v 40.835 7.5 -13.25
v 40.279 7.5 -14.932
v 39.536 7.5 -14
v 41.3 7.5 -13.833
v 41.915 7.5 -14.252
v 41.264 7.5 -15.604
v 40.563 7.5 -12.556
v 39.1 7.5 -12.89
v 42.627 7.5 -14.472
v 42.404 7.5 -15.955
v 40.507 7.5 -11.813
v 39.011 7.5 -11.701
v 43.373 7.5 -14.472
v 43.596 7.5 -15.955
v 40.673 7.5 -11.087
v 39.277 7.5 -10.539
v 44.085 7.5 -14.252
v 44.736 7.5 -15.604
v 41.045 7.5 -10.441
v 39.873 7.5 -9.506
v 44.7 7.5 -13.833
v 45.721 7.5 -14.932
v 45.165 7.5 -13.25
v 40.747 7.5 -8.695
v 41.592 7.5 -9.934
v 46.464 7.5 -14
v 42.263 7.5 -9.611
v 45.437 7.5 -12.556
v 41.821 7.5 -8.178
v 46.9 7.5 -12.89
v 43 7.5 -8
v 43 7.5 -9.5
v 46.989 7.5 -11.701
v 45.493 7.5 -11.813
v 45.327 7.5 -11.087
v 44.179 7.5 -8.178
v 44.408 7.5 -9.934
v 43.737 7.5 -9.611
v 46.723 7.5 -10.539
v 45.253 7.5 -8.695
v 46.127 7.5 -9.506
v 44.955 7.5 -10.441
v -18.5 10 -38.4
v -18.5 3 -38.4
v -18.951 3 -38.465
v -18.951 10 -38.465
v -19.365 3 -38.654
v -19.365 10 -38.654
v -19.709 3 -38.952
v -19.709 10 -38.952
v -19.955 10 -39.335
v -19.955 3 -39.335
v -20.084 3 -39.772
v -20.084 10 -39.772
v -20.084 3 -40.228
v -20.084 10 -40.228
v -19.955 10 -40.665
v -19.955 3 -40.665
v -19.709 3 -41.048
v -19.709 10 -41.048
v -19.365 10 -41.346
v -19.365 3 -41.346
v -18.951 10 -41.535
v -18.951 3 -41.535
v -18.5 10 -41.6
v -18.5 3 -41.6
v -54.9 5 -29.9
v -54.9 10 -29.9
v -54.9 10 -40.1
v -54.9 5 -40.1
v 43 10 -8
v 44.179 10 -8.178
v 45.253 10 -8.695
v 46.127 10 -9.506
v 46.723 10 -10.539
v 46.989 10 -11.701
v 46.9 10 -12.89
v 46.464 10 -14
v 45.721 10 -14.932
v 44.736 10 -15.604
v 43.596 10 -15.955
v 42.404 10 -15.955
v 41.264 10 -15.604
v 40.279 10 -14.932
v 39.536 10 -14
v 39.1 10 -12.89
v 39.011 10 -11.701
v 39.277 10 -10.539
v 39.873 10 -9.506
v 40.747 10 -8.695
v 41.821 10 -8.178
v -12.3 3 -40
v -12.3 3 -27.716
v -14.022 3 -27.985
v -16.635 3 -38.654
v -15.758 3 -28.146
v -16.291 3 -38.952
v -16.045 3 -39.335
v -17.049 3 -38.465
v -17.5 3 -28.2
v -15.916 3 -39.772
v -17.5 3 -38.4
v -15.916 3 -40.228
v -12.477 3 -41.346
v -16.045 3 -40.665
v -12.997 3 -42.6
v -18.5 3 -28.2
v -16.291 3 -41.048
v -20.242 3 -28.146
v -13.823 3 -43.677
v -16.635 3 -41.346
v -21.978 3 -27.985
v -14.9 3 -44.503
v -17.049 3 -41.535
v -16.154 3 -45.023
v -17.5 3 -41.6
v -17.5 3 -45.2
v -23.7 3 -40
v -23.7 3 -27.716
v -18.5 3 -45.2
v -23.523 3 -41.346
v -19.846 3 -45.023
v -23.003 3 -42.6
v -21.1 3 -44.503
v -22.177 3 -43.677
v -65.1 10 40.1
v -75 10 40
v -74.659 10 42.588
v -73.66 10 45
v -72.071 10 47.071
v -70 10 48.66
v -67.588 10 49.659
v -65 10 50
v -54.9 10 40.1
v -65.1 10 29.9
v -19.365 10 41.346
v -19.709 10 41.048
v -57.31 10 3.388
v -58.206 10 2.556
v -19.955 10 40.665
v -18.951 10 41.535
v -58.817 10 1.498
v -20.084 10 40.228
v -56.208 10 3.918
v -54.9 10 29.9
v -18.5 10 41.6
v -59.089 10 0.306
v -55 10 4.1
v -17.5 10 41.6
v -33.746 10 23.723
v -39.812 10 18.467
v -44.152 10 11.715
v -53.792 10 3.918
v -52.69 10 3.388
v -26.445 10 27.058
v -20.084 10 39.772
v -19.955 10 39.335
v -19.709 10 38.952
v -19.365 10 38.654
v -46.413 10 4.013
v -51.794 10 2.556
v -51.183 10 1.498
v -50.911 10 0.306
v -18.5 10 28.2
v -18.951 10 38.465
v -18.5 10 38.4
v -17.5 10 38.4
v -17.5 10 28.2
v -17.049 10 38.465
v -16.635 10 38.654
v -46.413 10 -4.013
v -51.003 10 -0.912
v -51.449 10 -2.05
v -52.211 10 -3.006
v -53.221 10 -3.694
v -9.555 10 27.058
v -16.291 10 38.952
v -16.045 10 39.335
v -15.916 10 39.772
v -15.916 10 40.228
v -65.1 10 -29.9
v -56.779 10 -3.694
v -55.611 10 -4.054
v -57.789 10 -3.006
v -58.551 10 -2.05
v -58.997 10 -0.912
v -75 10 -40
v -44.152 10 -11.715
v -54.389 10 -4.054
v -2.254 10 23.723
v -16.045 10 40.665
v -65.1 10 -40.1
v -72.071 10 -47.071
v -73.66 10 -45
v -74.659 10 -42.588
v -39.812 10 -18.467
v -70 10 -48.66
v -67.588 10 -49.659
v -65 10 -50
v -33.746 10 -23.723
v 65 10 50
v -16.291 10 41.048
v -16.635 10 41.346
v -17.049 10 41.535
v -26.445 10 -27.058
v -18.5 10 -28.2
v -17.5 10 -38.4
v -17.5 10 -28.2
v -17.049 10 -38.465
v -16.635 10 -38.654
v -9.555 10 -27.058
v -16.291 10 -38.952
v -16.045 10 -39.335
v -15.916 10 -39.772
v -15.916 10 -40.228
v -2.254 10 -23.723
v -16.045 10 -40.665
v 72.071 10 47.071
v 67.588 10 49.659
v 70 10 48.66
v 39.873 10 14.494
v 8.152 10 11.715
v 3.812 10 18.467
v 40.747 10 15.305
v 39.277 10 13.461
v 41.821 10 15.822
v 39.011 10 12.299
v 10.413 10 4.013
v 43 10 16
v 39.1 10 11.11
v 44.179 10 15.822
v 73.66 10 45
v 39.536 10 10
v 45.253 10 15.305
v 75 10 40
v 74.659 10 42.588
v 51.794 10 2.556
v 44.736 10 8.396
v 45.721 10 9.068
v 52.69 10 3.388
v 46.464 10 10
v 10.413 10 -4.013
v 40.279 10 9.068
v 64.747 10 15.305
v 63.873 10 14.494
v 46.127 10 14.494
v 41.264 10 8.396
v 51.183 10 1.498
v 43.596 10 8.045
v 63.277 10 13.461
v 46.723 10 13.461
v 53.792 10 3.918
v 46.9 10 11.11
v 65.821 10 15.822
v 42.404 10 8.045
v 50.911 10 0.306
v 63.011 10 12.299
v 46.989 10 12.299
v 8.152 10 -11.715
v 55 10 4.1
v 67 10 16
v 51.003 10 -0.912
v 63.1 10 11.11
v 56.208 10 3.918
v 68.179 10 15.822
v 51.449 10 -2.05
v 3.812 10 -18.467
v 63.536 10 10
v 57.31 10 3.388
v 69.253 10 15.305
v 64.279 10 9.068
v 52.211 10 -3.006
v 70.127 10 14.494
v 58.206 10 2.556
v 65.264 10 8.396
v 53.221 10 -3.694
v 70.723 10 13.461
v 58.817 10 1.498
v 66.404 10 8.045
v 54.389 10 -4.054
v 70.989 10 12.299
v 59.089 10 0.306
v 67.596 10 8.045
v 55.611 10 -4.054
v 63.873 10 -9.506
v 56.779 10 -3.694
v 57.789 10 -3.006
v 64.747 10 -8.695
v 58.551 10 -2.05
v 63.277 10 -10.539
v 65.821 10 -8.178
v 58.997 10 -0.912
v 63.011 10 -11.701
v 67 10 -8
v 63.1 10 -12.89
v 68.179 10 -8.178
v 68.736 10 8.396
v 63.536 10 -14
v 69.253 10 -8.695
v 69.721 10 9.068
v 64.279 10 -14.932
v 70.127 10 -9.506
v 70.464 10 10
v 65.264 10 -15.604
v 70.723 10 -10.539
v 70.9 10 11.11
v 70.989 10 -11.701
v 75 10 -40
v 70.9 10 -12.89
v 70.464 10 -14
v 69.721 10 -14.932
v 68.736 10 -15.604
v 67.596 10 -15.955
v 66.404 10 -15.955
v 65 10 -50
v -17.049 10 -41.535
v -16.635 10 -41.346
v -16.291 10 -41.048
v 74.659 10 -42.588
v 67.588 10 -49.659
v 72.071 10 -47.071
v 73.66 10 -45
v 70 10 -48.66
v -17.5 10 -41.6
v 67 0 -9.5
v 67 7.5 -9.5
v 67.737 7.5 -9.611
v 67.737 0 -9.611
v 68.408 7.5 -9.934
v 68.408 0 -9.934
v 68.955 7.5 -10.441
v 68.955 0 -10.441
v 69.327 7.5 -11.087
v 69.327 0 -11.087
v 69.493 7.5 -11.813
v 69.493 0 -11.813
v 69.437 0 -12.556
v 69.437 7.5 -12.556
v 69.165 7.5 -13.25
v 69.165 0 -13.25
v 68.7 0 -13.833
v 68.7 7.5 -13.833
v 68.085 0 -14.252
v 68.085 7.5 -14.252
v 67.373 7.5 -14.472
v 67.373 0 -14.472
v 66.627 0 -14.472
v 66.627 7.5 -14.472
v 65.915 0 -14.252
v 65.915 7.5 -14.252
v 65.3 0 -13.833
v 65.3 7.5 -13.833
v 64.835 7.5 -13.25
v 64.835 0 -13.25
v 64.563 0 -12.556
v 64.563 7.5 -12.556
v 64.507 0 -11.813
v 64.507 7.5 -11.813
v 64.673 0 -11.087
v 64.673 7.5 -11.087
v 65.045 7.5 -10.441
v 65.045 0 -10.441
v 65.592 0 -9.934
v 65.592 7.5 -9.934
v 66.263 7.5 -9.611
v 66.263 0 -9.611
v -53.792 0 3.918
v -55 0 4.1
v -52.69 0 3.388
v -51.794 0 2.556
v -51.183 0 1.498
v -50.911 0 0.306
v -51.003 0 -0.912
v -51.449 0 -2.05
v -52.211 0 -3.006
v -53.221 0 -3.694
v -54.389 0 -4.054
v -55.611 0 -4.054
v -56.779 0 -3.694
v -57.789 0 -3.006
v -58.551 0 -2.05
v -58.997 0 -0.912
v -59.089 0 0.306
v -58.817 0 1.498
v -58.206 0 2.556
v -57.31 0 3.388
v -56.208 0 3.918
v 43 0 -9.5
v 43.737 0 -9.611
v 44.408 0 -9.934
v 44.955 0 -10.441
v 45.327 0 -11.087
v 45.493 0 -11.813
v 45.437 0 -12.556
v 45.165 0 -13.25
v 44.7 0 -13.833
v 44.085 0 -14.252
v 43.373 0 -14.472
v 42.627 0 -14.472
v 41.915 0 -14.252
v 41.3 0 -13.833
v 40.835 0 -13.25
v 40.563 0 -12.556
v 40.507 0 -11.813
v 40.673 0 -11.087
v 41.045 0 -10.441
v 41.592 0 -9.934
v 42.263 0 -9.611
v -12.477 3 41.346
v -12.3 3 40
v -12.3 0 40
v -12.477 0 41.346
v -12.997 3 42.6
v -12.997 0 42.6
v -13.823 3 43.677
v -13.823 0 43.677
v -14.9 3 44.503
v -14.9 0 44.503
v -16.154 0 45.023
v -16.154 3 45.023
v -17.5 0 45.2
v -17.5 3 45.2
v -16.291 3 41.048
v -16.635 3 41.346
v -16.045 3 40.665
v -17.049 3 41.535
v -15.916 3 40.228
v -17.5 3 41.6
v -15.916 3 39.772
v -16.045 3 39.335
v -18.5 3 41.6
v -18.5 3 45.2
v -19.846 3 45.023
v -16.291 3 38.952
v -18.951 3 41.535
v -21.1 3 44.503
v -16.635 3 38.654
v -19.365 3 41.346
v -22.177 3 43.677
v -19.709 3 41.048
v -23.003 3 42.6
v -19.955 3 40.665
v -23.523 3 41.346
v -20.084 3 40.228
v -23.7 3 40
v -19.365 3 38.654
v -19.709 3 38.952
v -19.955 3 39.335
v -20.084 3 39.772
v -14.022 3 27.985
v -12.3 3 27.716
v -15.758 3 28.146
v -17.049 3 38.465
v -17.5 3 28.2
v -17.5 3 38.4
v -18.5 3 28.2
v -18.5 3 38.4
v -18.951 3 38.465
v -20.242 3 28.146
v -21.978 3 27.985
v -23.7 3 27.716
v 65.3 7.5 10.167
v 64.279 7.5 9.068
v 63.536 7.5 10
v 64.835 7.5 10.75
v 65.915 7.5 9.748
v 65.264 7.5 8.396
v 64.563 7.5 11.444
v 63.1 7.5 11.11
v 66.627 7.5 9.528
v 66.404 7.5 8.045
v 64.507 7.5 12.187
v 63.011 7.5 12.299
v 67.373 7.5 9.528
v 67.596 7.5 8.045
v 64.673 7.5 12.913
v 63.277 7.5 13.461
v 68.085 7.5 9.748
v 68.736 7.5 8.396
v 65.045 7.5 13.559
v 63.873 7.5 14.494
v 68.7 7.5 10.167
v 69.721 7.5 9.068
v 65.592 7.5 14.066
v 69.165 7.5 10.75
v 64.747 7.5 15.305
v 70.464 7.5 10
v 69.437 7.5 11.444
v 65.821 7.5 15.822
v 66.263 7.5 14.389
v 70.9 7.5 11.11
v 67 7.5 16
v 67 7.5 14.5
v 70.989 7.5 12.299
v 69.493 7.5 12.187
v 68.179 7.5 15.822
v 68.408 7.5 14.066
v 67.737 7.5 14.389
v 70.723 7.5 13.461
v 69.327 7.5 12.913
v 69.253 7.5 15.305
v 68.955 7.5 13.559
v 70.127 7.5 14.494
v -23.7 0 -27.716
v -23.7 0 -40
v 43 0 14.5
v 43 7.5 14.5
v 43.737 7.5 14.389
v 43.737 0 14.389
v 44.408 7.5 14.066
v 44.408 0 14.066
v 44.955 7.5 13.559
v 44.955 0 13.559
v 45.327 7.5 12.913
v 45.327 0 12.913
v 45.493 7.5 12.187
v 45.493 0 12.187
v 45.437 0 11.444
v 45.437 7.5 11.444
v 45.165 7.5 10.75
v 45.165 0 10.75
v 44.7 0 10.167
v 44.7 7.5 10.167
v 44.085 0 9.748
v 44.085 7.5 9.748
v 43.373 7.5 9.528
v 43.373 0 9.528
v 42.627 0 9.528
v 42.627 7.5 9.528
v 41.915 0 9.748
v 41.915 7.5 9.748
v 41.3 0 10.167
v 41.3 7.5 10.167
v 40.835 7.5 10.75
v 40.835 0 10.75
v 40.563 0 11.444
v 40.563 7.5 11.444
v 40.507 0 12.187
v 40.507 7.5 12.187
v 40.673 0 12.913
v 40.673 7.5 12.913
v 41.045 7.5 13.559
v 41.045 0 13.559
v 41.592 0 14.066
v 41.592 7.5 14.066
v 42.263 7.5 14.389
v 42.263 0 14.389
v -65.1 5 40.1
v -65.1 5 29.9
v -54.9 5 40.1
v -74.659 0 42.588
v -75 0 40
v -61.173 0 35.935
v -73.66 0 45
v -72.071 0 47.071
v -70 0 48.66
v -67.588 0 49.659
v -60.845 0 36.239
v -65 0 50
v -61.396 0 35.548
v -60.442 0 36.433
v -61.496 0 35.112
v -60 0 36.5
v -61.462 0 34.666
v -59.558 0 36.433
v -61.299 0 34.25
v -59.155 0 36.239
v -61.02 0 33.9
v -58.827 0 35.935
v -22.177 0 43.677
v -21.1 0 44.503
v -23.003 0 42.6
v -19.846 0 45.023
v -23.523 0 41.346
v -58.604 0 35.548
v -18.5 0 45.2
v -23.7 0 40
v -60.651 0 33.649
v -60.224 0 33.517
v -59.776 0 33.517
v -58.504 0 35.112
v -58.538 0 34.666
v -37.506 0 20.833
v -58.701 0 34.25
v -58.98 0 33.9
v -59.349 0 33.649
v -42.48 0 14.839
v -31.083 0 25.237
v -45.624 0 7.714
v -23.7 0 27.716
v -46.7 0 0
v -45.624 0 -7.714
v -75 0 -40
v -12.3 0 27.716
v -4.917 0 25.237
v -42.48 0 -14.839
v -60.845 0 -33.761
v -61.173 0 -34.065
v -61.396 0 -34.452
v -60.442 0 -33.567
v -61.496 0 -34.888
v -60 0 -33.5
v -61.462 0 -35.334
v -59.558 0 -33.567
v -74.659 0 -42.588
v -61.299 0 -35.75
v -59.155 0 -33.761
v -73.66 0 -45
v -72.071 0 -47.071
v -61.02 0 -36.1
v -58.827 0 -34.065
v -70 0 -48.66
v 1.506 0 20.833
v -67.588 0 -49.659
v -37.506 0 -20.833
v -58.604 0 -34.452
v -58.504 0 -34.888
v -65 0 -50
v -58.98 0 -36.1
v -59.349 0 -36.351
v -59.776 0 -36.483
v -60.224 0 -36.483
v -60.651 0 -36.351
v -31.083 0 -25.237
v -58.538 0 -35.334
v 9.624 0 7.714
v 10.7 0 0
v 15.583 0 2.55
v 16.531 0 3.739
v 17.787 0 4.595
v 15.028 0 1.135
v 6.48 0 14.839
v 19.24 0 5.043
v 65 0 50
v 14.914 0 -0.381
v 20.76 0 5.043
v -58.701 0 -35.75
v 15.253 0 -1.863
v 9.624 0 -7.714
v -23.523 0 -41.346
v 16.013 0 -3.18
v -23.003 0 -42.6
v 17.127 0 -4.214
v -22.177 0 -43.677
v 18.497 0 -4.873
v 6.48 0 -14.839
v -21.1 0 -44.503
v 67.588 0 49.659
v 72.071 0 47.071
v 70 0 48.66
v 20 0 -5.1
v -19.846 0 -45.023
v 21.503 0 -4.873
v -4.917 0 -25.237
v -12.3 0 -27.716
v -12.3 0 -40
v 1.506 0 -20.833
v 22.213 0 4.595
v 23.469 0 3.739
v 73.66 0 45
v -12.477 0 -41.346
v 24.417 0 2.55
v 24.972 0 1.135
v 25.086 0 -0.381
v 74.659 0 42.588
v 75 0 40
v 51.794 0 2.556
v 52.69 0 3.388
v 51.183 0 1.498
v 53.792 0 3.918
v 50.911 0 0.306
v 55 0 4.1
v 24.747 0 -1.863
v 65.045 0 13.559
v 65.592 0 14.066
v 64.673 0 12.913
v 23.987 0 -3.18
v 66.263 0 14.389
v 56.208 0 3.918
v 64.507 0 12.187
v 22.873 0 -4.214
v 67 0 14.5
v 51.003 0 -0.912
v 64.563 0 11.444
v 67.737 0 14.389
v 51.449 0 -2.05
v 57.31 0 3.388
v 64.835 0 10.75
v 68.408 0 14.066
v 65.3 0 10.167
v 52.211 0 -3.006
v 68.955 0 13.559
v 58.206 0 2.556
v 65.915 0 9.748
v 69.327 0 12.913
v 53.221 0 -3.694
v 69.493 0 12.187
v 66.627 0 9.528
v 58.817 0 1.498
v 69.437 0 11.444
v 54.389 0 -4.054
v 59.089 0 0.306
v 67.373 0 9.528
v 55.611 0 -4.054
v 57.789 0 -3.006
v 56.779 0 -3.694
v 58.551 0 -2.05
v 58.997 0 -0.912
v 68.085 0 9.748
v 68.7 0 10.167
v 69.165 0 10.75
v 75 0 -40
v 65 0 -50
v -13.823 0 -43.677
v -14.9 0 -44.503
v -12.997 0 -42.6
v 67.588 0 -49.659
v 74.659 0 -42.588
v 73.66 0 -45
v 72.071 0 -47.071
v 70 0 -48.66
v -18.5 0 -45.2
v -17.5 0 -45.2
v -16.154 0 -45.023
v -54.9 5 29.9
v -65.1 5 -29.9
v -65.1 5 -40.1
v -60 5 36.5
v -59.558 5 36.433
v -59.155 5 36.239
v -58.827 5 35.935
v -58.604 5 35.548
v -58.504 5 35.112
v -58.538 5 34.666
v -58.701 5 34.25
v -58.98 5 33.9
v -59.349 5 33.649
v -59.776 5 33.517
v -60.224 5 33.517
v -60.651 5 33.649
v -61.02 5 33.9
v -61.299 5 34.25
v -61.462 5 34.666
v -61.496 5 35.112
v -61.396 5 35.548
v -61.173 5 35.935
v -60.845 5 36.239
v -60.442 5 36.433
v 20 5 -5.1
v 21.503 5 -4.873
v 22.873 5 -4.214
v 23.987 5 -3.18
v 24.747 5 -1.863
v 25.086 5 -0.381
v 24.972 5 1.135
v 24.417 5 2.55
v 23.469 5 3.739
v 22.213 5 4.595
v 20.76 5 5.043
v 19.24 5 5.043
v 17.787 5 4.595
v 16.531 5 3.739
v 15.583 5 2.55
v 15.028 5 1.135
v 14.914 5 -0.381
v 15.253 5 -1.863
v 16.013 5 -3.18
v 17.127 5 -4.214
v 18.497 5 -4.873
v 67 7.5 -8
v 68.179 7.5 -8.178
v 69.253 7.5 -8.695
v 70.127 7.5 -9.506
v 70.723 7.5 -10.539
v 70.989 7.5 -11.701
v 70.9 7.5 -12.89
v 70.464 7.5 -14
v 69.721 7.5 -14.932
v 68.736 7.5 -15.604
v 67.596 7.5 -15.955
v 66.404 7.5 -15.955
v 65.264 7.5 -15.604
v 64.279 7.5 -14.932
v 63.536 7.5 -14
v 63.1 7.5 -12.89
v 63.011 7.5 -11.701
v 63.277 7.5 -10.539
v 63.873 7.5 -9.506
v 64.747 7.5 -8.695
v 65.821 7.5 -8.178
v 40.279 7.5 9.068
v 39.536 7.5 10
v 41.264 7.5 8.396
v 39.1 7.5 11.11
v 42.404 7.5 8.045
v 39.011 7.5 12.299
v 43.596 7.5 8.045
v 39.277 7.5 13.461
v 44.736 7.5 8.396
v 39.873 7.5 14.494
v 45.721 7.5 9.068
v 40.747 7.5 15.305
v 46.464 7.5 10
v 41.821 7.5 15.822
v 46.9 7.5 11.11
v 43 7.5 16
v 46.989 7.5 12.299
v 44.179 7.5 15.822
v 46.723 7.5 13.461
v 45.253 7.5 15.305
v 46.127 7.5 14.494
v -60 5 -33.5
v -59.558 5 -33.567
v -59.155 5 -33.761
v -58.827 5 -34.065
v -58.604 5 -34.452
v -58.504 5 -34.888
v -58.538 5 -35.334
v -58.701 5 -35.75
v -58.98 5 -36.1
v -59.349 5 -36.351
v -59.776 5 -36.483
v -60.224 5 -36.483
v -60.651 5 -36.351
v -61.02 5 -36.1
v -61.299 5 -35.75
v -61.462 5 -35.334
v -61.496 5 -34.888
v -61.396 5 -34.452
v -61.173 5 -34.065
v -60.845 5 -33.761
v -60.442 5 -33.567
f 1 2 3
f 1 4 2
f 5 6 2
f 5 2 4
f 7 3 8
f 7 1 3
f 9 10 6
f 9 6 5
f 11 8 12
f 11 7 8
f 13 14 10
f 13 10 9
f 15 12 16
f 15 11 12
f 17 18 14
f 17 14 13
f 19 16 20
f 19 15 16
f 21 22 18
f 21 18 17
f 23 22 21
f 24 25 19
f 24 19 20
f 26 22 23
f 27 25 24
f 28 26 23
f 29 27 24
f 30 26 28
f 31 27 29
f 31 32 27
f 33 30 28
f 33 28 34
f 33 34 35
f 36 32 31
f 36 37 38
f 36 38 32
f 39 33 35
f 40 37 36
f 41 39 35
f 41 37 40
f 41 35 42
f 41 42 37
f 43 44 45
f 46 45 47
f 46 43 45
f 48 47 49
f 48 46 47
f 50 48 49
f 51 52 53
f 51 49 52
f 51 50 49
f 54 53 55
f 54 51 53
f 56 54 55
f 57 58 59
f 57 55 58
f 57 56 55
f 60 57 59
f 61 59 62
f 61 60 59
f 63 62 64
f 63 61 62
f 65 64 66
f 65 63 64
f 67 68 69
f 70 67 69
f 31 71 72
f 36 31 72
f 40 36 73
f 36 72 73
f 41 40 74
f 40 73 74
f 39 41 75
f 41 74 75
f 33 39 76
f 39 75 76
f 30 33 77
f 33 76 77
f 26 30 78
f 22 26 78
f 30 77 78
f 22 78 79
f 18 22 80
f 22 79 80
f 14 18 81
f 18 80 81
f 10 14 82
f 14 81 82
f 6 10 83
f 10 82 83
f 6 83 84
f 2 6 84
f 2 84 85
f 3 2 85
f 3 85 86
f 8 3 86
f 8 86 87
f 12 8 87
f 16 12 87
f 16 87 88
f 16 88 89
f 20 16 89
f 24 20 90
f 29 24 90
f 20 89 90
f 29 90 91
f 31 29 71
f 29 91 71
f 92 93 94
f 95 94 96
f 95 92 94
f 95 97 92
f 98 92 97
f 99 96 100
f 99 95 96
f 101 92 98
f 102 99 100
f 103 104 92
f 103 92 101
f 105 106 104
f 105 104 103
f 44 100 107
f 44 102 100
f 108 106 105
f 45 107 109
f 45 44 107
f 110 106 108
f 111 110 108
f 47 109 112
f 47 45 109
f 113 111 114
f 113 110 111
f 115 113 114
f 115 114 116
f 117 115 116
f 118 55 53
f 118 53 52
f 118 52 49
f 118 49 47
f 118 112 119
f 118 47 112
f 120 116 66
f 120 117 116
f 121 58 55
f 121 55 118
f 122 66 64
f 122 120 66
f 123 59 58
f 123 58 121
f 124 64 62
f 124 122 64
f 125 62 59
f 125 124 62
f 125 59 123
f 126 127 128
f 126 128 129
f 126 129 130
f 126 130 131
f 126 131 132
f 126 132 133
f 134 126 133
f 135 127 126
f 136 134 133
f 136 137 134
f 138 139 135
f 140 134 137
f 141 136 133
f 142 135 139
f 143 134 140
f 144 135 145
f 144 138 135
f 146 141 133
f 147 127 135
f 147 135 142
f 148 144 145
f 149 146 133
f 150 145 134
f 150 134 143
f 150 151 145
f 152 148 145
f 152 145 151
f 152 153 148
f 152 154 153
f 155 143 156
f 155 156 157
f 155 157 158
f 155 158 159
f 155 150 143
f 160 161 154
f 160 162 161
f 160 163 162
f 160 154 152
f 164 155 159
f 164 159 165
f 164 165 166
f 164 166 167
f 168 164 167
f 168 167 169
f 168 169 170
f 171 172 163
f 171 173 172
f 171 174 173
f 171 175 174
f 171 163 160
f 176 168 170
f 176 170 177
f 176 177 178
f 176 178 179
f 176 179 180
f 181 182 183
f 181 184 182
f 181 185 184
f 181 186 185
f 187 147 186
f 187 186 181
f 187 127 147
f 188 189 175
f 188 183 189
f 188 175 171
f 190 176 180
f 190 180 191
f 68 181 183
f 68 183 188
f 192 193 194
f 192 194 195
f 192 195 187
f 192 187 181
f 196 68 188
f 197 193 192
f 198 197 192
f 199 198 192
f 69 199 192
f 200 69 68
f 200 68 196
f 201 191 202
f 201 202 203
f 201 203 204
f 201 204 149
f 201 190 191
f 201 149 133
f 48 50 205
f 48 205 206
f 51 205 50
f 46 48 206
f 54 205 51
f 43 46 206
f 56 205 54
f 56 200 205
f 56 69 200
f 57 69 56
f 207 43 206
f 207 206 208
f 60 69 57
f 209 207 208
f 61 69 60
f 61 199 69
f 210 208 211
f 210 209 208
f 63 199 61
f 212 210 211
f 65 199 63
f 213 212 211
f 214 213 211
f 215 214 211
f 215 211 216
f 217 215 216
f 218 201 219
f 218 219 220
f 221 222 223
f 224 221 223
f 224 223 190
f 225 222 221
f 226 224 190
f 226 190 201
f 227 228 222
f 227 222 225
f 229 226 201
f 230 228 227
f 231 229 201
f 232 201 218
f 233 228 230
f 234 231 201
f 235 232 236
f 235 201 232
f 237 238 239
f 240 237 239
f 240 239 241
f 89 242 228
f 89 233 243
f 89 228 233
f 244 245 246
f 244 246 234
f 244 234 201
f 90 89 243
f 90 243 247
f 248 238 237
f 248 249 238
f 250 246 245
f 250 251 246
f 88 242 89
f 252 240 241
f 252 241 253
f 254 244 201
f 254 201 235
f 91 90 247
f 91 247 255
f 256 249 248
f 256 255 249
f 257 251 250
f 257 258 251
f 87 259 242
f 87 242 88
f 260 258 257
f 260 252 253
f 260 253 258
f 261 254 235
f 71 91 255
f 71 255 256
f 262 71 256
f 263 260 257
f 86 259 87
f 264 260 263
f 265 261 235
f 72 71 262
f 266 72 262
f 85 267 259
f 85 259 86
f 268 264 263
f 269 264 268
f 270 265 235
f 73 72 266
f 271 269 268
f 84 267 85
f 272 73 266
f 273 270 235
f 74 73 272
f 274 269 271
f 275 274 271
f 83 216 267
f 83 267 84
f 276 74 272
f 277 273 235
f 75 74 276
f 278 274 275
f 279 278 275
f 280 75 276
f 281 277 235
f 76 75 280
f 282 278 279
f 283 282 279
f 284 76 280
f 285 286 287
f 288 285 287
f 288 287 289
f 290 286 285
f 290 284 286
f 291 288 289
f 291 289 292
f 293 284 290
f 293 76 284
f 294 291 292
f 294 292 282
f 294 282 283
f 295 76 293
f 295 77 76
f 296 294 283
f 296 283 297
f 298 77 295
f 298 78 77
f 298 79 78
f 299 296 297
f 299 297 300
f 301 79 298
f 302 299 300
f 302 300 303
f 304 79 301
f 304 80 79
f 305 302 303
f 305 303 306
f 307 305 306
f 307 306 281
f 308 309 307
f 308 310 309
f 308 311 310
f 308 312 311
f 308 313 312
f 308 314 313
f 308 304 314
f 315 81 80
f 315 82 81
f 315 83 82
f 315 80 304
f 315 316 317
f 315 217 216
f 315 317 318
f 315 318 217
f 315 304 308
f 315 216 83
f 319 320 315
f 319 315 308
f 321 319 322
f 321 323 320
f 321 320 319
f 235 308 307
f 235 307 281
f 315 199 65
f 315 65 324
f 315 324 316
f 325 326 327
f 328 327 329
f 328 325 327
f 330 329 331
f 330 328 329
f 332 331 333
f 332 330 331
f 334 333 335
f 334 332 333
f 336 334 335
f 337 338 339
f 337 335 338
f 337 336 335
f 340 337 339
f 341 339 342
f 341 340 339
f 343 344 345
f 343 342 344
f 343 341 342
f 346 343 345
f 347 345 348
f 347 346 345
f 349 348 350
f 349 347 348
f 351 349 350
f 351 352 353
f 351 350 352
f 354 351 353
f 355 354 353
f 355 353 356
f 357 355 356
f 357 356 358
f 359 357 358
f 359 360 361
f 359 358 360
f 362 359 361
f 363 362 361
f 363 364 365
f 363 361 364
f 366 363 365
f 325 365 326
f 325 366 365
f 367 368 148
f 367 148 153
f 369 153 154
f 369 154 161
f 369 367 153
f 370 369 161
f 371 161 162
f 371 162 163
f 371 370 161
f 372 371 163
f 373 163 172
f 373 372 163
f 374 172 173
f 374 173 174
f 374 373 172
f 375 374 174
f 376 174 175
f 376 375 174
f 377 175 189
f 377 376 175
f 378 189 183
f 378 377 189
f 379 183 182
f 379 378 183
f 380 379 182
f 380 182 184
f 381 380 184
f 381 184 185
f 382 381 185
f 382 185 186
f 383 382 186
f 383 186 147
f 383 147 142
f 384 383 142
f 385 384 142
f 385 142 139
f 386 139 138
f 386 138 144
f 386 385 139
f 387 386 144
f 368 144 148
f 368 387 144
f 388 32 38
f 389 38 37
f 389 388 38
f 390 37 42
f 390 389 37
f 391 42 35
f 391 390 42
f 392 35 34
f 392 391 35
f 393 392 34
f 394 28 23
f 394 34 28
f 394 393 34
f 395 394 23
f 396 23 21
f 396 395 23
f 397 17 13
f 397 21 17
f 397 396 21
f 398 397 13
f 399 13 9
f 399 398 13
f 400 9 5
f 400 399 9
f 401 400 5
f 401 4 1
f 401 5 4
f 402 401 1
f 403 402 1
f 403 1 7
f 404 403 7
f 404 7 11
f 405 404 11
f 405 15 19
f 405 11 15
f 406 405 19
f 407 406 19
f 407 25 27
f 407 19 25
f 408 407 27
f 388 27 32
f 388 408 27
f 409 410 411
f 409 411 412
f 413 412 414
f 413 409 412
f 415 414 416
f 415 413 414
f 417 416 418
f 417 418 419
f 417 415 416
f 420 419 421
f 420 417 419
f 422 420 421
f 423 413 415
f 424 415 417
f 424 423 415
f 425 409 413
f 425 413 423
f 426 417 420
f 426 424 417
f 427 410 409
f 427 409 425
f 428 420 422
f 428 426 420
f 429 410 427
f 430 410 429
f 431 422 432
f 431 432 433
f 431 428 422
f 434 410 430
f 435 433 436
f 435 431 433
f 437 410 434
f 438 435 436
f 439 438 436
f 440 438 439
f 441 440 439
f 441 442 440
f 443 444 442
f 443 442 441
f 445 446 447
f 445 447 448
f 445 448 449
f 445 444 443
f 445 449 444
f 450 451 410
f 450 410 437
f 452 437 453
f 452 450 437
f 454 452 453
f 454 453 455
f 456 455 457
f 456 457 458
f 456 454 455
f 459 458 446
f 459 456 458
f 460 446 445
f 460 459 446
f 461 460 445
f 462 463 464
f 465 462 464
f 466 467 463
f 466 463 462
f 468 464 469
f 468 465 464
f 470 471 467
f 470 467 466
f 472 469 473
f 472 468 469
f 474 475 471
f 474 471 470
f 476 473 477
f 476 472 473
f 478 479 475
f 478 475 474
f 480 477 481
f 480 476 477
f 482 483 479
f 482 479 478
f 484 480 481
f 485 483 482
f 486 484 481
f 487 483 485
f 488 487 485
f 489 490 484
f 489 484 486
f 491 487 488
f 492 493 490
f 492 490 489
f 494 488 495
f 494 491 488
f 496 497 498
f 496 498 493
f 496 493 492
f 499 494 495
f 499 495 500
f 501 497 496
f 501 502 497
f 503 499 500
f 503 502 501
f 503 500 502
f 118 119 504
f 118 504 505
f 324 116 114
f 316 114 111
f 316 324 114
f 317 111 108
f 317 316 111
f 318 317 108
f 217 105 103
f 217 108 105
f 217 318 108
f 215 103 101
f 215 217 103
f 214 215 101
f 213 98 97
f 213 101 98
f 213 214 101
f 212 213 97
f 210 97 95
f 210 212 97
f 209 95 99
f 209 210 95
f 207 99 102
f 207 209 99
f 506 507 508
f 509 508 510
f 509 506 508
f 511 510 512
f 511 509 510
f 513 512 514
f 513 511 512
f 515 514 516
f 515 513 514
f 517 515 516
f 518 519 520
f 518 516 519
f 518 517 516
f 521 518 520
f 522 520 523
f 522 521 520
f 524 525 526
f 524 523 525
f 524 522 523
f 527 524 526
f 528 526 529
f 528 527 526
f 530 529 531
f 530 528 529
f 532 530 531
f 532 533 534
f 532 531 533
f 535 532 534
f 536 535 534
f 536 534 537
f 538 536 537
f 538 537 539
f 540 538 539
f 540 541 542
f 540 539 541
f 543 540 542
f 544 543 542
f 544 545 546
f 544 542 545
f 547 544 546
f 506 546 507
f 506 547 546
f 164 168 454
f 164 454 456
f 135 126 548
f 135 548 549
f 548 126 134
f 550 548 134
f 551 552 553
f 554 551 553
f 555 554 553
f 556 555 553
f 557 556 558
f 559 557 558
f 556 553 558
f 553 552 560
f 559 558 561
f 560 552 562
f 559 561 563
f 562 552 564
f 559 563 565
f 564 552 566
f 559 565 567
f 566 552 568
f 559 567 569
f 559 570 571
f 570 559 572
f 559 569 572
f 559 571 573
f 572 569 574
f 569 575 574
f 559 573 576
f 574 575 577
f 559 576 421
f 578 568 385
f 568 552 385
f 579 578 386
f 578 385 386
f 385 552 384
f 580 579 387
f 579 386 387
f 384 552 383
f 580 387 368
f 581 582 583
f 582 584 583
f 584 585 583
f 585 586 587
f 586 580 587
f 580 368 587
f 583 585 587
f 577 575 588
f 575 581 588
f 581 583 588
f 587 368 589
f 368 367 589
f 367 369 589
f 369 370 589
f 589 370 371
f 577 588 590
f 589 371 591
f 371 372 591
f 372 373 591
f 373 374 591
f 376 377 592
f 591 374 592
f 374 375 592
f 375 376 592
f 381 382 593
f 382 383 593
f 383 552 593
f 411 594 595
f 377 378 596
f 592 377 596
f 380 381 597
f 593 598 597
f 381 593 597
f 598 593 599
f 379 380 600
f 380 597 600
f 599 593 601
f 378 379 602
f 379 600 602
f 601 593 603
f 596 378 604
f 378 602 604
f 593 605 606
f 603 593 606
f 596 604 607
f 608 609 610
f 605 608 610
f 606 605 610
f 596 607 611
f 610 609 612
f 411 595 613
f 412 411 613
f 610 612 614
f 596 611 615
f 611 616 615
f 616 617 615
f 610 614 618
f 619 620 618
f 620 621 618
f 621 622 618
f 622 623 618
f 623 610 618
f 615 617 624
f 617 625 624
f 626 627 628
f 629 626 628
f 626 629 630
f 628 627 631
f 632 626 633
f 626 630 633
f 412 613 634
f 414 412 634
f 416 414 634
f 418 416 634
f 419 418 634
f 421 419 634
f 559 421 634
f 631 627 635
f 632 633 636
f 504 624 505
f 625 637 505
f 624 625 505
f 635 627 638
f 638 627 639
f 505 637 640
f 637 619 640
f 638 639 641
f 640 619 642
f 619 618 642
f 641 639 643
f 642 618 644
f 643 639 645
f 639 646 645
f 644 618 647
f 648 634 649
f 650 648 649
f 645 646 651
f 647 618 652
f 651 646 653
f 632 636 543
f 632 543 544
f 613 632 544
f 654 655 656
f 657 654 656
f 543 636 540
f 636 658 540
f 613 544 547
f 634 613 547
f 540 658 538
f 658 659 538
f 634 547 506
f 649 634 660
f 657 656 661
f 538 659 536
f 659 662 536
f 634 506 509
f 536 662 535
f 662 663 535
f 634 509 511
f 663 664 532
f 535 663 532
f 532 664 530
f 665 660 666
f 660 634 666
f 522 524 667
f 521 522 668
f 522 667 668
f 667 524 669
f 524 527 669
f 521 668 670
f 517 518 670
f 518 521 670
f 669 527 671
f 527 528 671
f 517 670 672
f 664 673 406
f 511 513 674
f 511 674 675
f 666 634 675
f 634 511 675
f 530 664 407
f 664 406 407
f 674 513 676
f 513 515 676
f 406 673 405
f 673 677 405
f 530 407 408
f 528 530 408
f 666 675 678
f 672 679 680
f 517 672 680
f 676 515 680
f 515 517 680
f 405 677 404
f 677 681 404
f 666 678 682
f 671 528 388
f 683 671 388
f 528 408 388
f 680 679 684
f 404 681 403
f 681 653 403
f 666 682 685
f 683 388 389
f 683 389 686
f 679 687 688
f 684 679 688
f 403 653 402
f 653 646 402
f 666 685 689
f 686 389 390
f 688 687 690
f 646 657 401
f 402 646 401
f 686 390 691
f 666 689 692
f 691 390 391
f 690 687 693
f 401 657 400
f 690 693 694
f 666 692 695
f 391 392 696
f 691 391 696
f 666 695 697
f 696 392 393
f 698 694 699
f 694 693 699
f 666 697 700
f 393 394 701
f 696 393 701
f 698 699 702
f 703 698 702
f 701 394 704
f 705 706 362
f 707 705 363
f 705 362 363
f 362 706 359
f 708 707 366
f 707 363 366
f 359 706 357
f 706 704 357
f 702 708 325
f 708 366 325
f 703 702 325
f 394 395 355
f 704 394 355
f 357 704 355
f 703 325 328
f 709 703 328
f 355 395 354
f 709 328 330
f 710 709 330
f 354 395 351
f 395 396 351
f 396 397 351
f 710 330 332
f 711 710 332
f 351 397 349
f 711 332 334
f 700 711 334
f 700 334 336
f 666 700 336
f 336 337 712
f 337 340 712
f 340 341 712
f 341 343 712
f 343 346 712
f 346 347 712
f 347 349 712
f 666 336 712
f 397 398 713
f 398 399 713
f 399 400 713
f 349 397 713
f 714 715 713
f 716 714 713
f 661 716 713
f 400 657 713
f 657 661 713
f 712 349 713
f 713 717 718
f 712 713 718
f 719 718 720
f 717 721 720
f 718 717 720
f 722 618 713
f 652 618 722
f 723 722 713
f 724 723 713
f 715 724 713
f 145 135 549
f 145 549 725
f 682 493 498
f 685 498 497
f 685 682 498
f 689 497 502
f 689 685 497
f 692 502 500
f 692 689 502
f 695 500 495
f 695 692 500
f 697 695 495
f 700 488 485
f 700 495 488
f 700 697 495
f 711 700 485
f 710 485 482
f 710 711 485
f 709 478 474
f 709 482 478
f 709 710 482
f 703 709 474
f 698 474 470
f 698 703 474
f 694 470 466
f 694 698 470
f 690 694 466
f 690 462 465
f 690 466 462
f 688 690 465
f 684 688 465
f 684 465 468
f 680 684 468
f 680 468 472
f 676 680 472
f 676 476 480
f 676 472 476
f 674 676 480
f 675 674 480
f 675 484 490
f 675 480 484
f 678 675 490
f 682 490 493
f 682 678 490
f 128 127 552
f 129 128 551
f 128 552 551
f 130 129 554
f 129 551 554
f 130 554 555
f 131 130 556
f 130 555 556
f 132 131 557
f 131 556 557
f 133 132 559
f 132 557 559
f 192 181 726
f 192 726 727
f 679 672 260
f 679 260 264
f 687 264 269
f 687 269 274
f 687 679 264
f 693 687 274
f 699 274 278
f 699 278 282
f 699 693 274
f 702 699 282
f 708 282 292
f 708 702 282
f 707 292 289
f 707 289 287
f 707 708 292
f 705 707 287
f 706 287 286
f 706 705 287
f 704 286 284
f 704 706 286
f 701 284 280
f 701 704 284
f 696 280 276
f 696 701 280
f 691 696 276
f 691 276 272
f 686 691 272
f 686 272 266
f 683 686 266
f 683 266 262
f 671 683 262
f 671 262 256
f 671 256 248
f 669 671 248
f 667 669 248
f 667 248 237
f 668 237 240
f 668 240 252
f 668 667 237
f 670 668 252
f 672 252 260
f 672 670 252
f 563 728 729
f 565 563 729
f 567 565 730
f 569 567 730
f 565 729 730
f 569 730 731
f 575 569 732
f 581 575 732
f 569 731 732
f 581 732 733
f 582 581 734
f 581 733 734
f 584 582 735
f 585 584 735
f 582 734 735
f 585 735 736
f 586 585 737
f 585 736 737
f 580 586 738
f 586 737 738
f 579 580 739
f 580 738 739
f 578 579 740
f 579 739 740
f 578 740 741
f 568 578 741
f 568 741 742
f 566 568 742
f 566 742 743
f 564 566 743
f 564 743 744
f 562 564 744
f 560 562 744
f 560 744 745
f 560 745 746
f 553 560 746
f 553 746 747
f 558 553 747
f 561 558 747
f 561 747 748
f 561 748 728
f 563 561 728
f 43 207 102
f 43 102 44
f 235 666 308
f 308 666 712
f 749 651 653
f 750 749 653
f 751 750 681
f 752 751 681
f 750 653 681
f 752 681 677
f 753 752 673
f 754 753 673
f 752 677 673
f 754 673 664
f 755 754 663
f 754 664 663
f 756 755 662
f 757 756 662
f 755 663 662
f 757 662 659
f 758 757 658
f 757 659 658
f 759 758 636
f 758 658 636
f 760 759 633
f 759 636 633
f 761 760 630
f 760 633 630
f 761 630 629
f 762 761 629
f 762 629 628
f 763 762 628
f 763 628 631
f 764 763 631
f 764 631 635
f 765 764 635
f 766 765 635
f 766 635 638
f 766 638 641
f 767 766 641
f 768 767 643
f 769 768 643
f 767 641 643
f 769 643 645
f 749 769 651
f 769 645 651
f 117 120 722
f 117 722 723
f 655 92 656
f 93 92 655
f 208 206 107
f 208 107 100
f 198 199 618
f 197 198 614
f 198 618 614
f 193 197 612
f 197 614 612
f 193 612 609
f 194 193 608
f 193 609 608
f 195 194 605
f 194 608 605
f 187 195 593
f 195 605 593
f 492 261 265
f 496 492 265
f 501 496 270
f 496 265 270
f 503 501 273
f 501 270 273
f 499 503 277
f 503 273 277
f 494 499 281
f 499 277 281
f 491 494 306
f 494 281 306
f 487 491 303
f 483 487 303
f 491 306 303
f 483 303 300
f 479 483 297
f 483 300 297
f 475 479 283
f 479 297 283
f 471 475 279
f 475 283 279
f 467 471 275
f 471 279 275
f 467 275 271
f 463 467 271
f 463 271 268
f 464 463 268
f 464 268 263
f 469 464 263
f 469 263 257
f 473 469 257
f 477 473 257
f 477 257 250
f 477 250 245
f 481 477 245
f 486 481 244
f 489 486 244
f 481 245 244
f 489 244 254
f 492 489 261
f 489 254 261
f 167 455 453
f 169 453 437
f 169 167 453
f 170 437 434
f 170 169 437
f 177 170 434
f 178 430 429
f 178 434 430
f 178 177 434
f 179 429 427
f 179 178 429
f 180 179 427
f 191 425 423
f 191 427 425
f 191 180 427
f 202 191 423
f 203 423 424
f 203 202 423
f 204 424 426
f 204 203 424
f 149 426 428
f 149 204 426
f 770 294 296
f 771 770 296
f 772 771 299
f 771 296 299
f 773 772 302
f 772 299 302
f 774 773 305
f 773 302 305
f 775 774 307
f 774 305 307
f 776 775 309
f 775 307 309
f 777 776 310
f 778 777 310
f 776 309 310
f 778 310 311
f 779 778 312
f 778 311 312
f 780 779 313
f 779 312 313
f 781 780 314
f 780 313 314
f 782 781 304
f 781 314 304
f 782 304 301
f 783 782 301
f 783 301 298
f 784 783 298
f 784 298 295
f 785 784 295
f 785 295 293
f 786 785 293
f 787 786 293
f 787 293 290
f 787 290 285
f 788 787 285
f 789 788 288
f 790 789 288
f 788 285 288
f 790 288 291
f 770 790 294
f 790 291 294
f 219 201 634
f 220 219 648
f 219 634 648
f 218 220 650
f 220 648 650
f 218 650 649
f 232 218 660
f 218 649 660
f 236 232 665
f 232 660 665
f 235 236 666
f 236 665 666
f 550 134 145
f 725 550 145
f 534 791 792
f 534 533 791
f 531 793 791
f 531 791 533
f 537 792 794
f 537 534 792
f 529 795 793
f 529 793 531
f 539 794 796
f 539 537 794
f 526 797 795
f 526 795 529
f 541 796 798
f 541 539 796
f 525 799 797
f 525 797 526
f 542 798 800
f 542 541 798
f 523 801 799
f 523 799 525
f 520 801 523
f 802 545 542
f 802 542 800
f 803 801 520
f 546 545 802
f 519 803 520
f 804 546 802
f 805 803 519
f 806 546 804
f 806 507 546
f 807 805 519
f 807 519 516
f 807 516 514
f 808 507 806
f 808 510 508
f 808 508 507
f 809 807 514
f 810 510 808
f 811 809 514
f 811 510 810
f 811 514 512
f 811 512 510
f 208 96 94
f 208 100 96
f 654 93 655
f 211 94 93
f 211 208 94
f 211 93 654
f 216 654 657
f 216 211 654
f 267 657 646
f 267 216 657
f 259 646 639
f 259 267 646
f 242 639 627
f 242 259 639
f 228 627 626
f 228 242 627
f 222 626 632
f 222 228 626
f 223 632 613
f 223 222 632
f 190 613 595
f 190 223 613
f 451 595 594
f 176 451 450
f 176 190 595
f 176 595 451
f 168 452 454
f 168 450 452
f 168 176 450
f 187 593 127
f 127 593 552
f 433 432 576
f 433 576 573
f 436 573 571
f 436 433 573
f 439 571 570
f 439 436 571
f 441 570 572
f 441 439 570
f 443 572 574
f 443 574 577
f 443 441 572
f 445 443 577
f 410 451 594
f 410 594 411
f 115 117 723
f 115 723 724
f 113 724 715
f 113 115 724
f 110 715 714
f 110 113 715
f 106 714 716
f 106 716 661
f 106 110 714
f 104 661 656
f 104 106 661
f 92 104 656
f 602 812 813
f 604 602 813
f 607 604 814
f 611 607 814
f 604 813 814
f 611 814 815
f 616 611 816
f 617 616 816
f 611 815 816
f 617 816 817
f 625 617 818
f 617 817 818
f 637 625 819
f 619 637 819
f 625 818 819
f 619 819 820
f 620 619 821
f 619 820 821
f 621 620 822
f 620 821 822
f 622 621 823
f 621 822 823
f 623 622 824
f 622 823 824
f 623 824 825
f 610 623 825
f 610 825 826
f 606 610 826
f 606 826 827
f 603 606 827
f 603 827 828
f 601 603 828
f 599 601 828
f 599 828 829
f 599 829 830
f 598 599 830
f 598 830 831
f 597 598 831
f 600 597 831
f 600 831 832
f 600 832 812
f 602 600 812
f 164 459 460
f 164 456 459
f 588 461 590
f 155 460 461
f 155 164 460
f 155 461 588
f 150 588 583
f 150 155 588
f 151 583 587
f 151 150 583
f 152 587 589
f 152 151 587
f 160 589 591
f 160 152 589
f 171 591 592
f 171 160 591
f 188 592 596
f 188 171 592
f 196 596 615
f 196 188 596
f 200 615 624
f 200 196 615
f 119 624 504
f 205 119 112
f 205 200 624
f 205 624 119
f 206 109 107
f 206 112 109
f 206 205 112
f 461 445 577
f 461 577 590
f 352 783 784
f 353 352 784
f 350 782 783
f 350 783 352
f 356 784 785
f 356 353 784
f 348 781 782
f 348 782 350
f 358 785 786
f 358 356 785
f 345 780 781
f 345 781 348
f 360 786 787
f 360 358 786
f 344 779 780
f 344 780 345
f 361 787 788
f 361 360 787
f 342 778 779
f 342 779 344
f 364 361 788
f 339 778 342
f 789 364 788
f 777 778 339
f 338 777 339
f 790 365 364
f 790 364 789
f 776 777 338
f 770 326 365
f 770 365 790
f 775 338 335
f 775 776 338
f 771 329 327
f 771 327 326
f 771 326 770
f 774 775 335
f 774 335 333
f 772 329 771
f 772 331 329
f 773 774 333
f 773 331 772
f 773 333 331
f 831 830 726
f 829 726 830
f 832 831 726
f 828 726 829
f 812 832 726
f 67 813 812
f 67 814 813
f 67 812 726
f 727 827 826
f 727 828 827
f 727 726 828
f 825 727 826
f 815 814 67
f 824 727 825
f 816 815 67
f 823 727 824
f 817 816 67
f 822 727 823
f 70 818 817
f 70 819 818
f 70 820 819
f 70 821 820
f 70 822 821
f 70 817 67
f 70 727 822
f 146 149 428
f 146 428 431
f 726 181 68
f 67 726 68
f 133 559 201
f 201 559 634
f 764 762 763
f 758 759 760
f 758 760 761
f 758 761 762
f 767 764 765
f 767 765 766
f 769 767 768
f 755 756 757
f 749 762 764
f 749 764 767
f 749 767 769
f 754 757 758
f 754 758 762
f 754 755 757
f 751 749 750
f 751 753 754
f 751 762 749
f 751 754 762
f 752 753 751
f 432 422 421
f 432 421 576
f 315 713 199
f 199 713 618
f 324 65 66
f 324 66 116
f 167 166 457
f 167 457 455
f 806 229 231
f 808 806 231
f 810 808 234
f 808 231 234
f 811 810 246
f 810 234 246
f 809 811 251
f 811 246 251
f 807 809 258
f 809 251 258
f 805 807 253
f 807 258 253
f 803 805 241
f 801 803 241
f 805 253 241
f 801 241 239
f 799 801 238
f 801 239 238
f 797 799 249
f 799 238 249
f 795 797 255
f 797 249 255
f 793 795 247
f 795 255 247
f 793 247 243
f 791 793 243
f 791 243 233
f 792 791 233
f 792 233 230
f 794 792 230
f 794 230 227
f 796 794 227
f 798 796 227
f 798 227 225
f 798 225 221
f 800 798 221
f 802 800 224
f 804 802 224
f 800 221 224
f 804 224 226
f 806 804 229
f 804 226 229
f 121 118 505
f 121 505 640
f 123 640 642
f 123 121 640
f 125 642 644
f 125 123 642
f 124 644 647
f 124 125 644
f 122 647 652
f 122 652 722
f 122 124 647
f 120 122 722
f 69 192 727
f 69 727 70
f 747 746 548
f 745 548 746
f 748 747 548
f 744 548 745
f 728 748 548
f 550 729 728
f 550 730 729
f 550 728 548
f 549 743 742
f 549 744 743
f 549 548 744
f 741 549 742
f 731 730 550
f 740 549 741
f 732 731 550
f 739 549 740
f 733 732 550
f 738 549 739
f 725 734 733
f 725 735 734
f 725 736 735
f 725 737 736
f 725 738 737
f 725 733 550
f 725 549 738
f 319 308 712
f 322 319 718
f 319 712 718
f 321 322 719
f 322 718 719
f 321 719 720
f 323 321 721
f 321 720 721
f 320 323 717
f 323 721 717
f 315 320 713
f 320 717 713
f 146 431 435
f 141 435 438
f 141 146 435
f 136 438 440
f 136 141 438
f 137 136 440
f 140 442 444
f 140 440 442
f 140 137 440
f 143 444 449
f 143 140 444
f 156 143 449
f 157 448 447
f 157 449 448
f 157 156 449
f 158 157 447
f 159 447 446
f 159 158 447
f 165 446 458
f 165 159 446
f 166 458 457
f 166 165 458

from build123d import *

# Parameters (mm, degrees)
SKETCH_1_R          = 4.1
SKETCH_1_R_2        = 2.5
EXTRUDE_1_DEPTH     = 10
CUT_EXTRUDE_3_REACH = 92.692
CUT_EXTRUDE_START   = 3
CUT_EXTRUDE_4_DEPTH = 3
SKETCH_7_R          = 5.1
CUT_EXTRUDE_5_DEPTH = 5
SKETCH_8_R          = 4
CUT_EXTRUDE_6_DEPTH = 2.5
SKETCH_9_R          = 1.5
CUT_EXTRUDE_7_DEPTH = 91.691785736
SKETCH_10_W         = 10.2
SKETCH_10_H         = 10.2
CUT_EXTRUDE_8_DEPTH = 5


with BuildPart() as part:
    # ｽｹｯﾁ1 → ﾎﾞｽ - 押し出し1 (new body)
    with BuildSketch(Plane(origin=(0, 0, 0), x_dir=(1, 0, 0), z_dir=(0, 1, 0))):
        with BuildLine():
            Line((-65, -50), (65, -50))
            ThreePointArc((65, -50), (72.071067812, -47.071067812), (75, -40))
            Line((75, -40), (75, 40))
            ThreePointArc((75, 40), (72.071067812, 47.071067812), (65, 50))
            Line((65, 50), (-65, 50))
            ThreePointArc((-65, 50), (-72.071067812, 47.071067812), (-75, 40))
            Line((-75, 40), (-75, -40))
            ThreePointArc((-75, -40), (-72.071067812, -47.071067812), (-65, -50))
        make_face()
        with Locations(Location((55, 0, 0), (0, 0, 270))):
            Circle(SKETCH_1_R, mode=Mode.SUBTRACT)
        with Locations(Location((43, 12, 0), (0, 0, 270))):
            Circle(SKETCH_1_R_2, mode=Mode.SUBTRACT)
        with Locations(Location((67, 12, 0), (0, 0, 270))):
            Circle(SKETCH_1_R_2, mode=Mode.SUBTRACT)
        with Locations(Location((67, -12, 0), (0, 0, 270))):
            Circle(SKETCH_1_R_2, mode=Mode.SUBTRACT)
        with Locations(Location((43, -12, 0), (0, 0, 270))):
            Circle(SKETCH_1_R_2, mode=Mode.SUBTRACT)
        with Locations(Location((-55, 0, 0), (0, 0, 270))):
            Circle(SKETCH_1_R, mode=Mode.SUBTRACT)
    extrude(amount=EXTRUDE_1_DEPTH)

    # ｽｹｯﾁ5 → ｶｯﾄ - 押し出し3 (cut, up to next)
    with BuildSketch(Plane(origin=(0, 10, 0), x_dir=(1, 0, 0), z_dir=(0, 1, 0)), mode=Mode.PRIVATE) as cut_extrude_3_sk1:
        with BuildLine():
            Line((-18.5, 28.2), (-17.5, 28.2))
            ThreePointArc((-17.5, 28.2), (10.7, 0), (-17.5, -28.2))
            Line((-17.5, -28.2), (-18.5, -28.2))
            ThreePointArc((-18.5, -28.2), (-46.7, 0), (-18.5, 28.2))
        make_face()
    cut_extrude_3_tool1 = extrude(cut_extrude_3_sk1.sketch, amount=-CUT_EXTRUDE_3_REACH, mode=Mode.PRIVATE) & part.part
    # ｽｹｯﾁ5 → ｶｯﾄ - 押し出し3 (cut, up to next)
    with BuildSketch(Plane(origin=(0, 10, 0), x_dir=(1, 0, 0), z_dir=(0, 1, 0)), mode=Mode.PRIVATE) as cut_extrude_3_sk2:
        with BuildLine():
            Line((-18.5, 41.6), (-17.5, 41.6))
            ThreePointArc((-17.5, 41.6), (-15.9, 40), (-17.5, 38.4))
            Line((-17.5, 38.4), (-18.5, 38.4))
            ThreePointArc((-18.5, 38.4), (-20.1, 40), (-18.5, 41.6))
        make_face()
    cut_extrude_3_tool2 = extrude(cut_extrude_3_sk2.sketch, amount=-CUT_EXTRUDE_3_REACH, mode=Mode.PRIVATE) & part.part
    # ｽｹｯﾁ5 → ｶｯﾄ - 押し出し3 (cut, up to next)
    with BuildSketch(Plane(origin=(0, 10, 0), x_dir=(1, 0, 0), z_dir=(0, 1, 0)), mode=Mode.PRIVATE) as cut_extrude_3_sk3:
        with BuildLine():
            Line((-18.5, -38.4), (-17.5, -38.4))
            ThreePointArc((-17.5, -38.4), (-15.9, -40), (-17.5, -41.6))
            Line((-17.5, -41.6), (-18.5, -41.6))
            ThreePointArc((-18.5, -41.6), (-20.1, -40), (-18.5, -38.4))
        make_face()
    cut_extrude_3_tool3 = extrude(cut_extrude_3_sk3.sketch, amount=-CUT_EXTRUDE_3_REACH, mode=Mode.PRIVATE) & part.part
    add(cut_extrude_3_tool1.solids().sort_by_distance((-18, 10, 0))[0], mode=Mode.SUBTRACT)
    add(cut_extrude_3_tool2.solids().sort_by_distance((-18, 10, -40))[0], mode=Mode.SUBTRACT)
    add(cut_extrude_3_tool3.solids().sort_by_distance((-18, 10, 40))[0], mode=Mode.SUBTRACT)

    # ｽｹｯﾁ6 → ｶｯﾄ - 押し出し4 (cut)
    with BuildSketch(Plane(origin=(0, 0, 0), x_dir=(1, 0, 0), z_dir=(0, 1, 0)).offset(CUT_EXTRUDE_START)):
        with BuildLine():
            Line((-18.5, 45.2), (-17.5, 45.2))
            ThreePointArc((-17.5, 45.2), (-13.823044738, 43.676955262), (-12.3, 40))
            Line((-12.3, 40), (-12.3, 27.716421125))
            ThreePointArc((-12.3, 27.716421125), (10.7, 0), (-12.3, -27.716421125))
            Line((-12.3, -27.716421125), (-12.3, -40))
            ThreePointArc((-12.3, -40), (-13.823044738, -43.676955262), (-17.5, -45.2))
            Line((-17.5, -45.2), (-18.5, -45.2))
            ThreePointArc((-18.5, -45.2), (-22.176955262, -43.676955262), (-23.7, -40))
            Line((-23.7, -40), (-23.7, -27.716421125))
            ThreePointArc((-23.7, -27.716421125), (-46.7, 0), (-23.7, 27.716421125))
            Line((-23.7, 27.716421125), (-23.7, 40))
            ThreePointArc((-23.7, 40), (-22.176955262, 43.676955262), (-18.5, 45.2))
        make_face()
    extrude(amount=-CUT_EXTRUDE_4_DEPTH, mode=Mode.SUBTRACT)

    # ｽｹｯﾁ7 → ｶｯﾄ - 押し出し5 (cut)
    with BuildSketch(Plane.XZ):
        with Locations(Location((20, 0, 0), (0, 0, 270))):
            Circle(SKETCH_7_R)
    extrude(amount=-CUT_EXTRUDE_5_DEPTH, mode=Mode.SUBTRACT)

    # ｽｹｯﾁ8 → ｶｯﾄ - 押し出し6 (cut)
    with BuildSketch(Plane(origin=(0, 10, 0), x_dir=(1, 0, 0), z_dir=(0, 1, 0))):
        with Locations(Location((43, 12, 0), (0, 0, 270))):
            Circle(SKETCH_8_R)
        with Locations(Location((67, 12, 0), (0, 0, 270))):
            Circle(SKETCH_8_R)
        with Locations(Location((43, -12, 0), (0, 0, 270))):
            Circle(SKETCH_8_R)
        with Locations(Location((67, -12, 0), (0, 0, 270))):
            Circle(SKETCH_8_R)
    extrude(amount=-CUT_EXTRUDE_6_DEPTH, mode=Mode.SUBTRACT)

    # ｽｹｯﾁ9 → ｶｯﾄ - 押し出し7 (cut, through all)
    with BuildSketch(Plane(origin=(0, 10, 0), x_dir=(1, 0, 0), z_dir=(0, 1, 0))):
        with Locations(Location((-60, 35, 0), (0, 0, 270))):
            Circle(SKETCH_9_R)
        with Locations(Location((-60, -35, 0), (0, 0, 270))):
            Circle(SKETCH_9_R)
    extrude(amount=-CUT_EXTRUDE_7_DEPTH, mode=Mode.SUBTRACT)

    # ｽｹｯﾁ10 → ｶｯﾄ - 押し出し8 (cut)
    with BuildSketch(Plane(origin=(0, 10, 0), x_dir=(1, 0, 0), z_dir=(0, 1, 0))):
        with Locations((-60, 35)):
            Rectangle(SKETCH_10_W, SKETCH_10_H)
        with Locations((-60, -35)):
            Rectangle(SKETCH_10_W, SKETCH_10_H)
    extrude(amount=-CUT_EXTRUDE_8_DEPTH, mode=Mode.SUBTRACT)


solid = part.part
